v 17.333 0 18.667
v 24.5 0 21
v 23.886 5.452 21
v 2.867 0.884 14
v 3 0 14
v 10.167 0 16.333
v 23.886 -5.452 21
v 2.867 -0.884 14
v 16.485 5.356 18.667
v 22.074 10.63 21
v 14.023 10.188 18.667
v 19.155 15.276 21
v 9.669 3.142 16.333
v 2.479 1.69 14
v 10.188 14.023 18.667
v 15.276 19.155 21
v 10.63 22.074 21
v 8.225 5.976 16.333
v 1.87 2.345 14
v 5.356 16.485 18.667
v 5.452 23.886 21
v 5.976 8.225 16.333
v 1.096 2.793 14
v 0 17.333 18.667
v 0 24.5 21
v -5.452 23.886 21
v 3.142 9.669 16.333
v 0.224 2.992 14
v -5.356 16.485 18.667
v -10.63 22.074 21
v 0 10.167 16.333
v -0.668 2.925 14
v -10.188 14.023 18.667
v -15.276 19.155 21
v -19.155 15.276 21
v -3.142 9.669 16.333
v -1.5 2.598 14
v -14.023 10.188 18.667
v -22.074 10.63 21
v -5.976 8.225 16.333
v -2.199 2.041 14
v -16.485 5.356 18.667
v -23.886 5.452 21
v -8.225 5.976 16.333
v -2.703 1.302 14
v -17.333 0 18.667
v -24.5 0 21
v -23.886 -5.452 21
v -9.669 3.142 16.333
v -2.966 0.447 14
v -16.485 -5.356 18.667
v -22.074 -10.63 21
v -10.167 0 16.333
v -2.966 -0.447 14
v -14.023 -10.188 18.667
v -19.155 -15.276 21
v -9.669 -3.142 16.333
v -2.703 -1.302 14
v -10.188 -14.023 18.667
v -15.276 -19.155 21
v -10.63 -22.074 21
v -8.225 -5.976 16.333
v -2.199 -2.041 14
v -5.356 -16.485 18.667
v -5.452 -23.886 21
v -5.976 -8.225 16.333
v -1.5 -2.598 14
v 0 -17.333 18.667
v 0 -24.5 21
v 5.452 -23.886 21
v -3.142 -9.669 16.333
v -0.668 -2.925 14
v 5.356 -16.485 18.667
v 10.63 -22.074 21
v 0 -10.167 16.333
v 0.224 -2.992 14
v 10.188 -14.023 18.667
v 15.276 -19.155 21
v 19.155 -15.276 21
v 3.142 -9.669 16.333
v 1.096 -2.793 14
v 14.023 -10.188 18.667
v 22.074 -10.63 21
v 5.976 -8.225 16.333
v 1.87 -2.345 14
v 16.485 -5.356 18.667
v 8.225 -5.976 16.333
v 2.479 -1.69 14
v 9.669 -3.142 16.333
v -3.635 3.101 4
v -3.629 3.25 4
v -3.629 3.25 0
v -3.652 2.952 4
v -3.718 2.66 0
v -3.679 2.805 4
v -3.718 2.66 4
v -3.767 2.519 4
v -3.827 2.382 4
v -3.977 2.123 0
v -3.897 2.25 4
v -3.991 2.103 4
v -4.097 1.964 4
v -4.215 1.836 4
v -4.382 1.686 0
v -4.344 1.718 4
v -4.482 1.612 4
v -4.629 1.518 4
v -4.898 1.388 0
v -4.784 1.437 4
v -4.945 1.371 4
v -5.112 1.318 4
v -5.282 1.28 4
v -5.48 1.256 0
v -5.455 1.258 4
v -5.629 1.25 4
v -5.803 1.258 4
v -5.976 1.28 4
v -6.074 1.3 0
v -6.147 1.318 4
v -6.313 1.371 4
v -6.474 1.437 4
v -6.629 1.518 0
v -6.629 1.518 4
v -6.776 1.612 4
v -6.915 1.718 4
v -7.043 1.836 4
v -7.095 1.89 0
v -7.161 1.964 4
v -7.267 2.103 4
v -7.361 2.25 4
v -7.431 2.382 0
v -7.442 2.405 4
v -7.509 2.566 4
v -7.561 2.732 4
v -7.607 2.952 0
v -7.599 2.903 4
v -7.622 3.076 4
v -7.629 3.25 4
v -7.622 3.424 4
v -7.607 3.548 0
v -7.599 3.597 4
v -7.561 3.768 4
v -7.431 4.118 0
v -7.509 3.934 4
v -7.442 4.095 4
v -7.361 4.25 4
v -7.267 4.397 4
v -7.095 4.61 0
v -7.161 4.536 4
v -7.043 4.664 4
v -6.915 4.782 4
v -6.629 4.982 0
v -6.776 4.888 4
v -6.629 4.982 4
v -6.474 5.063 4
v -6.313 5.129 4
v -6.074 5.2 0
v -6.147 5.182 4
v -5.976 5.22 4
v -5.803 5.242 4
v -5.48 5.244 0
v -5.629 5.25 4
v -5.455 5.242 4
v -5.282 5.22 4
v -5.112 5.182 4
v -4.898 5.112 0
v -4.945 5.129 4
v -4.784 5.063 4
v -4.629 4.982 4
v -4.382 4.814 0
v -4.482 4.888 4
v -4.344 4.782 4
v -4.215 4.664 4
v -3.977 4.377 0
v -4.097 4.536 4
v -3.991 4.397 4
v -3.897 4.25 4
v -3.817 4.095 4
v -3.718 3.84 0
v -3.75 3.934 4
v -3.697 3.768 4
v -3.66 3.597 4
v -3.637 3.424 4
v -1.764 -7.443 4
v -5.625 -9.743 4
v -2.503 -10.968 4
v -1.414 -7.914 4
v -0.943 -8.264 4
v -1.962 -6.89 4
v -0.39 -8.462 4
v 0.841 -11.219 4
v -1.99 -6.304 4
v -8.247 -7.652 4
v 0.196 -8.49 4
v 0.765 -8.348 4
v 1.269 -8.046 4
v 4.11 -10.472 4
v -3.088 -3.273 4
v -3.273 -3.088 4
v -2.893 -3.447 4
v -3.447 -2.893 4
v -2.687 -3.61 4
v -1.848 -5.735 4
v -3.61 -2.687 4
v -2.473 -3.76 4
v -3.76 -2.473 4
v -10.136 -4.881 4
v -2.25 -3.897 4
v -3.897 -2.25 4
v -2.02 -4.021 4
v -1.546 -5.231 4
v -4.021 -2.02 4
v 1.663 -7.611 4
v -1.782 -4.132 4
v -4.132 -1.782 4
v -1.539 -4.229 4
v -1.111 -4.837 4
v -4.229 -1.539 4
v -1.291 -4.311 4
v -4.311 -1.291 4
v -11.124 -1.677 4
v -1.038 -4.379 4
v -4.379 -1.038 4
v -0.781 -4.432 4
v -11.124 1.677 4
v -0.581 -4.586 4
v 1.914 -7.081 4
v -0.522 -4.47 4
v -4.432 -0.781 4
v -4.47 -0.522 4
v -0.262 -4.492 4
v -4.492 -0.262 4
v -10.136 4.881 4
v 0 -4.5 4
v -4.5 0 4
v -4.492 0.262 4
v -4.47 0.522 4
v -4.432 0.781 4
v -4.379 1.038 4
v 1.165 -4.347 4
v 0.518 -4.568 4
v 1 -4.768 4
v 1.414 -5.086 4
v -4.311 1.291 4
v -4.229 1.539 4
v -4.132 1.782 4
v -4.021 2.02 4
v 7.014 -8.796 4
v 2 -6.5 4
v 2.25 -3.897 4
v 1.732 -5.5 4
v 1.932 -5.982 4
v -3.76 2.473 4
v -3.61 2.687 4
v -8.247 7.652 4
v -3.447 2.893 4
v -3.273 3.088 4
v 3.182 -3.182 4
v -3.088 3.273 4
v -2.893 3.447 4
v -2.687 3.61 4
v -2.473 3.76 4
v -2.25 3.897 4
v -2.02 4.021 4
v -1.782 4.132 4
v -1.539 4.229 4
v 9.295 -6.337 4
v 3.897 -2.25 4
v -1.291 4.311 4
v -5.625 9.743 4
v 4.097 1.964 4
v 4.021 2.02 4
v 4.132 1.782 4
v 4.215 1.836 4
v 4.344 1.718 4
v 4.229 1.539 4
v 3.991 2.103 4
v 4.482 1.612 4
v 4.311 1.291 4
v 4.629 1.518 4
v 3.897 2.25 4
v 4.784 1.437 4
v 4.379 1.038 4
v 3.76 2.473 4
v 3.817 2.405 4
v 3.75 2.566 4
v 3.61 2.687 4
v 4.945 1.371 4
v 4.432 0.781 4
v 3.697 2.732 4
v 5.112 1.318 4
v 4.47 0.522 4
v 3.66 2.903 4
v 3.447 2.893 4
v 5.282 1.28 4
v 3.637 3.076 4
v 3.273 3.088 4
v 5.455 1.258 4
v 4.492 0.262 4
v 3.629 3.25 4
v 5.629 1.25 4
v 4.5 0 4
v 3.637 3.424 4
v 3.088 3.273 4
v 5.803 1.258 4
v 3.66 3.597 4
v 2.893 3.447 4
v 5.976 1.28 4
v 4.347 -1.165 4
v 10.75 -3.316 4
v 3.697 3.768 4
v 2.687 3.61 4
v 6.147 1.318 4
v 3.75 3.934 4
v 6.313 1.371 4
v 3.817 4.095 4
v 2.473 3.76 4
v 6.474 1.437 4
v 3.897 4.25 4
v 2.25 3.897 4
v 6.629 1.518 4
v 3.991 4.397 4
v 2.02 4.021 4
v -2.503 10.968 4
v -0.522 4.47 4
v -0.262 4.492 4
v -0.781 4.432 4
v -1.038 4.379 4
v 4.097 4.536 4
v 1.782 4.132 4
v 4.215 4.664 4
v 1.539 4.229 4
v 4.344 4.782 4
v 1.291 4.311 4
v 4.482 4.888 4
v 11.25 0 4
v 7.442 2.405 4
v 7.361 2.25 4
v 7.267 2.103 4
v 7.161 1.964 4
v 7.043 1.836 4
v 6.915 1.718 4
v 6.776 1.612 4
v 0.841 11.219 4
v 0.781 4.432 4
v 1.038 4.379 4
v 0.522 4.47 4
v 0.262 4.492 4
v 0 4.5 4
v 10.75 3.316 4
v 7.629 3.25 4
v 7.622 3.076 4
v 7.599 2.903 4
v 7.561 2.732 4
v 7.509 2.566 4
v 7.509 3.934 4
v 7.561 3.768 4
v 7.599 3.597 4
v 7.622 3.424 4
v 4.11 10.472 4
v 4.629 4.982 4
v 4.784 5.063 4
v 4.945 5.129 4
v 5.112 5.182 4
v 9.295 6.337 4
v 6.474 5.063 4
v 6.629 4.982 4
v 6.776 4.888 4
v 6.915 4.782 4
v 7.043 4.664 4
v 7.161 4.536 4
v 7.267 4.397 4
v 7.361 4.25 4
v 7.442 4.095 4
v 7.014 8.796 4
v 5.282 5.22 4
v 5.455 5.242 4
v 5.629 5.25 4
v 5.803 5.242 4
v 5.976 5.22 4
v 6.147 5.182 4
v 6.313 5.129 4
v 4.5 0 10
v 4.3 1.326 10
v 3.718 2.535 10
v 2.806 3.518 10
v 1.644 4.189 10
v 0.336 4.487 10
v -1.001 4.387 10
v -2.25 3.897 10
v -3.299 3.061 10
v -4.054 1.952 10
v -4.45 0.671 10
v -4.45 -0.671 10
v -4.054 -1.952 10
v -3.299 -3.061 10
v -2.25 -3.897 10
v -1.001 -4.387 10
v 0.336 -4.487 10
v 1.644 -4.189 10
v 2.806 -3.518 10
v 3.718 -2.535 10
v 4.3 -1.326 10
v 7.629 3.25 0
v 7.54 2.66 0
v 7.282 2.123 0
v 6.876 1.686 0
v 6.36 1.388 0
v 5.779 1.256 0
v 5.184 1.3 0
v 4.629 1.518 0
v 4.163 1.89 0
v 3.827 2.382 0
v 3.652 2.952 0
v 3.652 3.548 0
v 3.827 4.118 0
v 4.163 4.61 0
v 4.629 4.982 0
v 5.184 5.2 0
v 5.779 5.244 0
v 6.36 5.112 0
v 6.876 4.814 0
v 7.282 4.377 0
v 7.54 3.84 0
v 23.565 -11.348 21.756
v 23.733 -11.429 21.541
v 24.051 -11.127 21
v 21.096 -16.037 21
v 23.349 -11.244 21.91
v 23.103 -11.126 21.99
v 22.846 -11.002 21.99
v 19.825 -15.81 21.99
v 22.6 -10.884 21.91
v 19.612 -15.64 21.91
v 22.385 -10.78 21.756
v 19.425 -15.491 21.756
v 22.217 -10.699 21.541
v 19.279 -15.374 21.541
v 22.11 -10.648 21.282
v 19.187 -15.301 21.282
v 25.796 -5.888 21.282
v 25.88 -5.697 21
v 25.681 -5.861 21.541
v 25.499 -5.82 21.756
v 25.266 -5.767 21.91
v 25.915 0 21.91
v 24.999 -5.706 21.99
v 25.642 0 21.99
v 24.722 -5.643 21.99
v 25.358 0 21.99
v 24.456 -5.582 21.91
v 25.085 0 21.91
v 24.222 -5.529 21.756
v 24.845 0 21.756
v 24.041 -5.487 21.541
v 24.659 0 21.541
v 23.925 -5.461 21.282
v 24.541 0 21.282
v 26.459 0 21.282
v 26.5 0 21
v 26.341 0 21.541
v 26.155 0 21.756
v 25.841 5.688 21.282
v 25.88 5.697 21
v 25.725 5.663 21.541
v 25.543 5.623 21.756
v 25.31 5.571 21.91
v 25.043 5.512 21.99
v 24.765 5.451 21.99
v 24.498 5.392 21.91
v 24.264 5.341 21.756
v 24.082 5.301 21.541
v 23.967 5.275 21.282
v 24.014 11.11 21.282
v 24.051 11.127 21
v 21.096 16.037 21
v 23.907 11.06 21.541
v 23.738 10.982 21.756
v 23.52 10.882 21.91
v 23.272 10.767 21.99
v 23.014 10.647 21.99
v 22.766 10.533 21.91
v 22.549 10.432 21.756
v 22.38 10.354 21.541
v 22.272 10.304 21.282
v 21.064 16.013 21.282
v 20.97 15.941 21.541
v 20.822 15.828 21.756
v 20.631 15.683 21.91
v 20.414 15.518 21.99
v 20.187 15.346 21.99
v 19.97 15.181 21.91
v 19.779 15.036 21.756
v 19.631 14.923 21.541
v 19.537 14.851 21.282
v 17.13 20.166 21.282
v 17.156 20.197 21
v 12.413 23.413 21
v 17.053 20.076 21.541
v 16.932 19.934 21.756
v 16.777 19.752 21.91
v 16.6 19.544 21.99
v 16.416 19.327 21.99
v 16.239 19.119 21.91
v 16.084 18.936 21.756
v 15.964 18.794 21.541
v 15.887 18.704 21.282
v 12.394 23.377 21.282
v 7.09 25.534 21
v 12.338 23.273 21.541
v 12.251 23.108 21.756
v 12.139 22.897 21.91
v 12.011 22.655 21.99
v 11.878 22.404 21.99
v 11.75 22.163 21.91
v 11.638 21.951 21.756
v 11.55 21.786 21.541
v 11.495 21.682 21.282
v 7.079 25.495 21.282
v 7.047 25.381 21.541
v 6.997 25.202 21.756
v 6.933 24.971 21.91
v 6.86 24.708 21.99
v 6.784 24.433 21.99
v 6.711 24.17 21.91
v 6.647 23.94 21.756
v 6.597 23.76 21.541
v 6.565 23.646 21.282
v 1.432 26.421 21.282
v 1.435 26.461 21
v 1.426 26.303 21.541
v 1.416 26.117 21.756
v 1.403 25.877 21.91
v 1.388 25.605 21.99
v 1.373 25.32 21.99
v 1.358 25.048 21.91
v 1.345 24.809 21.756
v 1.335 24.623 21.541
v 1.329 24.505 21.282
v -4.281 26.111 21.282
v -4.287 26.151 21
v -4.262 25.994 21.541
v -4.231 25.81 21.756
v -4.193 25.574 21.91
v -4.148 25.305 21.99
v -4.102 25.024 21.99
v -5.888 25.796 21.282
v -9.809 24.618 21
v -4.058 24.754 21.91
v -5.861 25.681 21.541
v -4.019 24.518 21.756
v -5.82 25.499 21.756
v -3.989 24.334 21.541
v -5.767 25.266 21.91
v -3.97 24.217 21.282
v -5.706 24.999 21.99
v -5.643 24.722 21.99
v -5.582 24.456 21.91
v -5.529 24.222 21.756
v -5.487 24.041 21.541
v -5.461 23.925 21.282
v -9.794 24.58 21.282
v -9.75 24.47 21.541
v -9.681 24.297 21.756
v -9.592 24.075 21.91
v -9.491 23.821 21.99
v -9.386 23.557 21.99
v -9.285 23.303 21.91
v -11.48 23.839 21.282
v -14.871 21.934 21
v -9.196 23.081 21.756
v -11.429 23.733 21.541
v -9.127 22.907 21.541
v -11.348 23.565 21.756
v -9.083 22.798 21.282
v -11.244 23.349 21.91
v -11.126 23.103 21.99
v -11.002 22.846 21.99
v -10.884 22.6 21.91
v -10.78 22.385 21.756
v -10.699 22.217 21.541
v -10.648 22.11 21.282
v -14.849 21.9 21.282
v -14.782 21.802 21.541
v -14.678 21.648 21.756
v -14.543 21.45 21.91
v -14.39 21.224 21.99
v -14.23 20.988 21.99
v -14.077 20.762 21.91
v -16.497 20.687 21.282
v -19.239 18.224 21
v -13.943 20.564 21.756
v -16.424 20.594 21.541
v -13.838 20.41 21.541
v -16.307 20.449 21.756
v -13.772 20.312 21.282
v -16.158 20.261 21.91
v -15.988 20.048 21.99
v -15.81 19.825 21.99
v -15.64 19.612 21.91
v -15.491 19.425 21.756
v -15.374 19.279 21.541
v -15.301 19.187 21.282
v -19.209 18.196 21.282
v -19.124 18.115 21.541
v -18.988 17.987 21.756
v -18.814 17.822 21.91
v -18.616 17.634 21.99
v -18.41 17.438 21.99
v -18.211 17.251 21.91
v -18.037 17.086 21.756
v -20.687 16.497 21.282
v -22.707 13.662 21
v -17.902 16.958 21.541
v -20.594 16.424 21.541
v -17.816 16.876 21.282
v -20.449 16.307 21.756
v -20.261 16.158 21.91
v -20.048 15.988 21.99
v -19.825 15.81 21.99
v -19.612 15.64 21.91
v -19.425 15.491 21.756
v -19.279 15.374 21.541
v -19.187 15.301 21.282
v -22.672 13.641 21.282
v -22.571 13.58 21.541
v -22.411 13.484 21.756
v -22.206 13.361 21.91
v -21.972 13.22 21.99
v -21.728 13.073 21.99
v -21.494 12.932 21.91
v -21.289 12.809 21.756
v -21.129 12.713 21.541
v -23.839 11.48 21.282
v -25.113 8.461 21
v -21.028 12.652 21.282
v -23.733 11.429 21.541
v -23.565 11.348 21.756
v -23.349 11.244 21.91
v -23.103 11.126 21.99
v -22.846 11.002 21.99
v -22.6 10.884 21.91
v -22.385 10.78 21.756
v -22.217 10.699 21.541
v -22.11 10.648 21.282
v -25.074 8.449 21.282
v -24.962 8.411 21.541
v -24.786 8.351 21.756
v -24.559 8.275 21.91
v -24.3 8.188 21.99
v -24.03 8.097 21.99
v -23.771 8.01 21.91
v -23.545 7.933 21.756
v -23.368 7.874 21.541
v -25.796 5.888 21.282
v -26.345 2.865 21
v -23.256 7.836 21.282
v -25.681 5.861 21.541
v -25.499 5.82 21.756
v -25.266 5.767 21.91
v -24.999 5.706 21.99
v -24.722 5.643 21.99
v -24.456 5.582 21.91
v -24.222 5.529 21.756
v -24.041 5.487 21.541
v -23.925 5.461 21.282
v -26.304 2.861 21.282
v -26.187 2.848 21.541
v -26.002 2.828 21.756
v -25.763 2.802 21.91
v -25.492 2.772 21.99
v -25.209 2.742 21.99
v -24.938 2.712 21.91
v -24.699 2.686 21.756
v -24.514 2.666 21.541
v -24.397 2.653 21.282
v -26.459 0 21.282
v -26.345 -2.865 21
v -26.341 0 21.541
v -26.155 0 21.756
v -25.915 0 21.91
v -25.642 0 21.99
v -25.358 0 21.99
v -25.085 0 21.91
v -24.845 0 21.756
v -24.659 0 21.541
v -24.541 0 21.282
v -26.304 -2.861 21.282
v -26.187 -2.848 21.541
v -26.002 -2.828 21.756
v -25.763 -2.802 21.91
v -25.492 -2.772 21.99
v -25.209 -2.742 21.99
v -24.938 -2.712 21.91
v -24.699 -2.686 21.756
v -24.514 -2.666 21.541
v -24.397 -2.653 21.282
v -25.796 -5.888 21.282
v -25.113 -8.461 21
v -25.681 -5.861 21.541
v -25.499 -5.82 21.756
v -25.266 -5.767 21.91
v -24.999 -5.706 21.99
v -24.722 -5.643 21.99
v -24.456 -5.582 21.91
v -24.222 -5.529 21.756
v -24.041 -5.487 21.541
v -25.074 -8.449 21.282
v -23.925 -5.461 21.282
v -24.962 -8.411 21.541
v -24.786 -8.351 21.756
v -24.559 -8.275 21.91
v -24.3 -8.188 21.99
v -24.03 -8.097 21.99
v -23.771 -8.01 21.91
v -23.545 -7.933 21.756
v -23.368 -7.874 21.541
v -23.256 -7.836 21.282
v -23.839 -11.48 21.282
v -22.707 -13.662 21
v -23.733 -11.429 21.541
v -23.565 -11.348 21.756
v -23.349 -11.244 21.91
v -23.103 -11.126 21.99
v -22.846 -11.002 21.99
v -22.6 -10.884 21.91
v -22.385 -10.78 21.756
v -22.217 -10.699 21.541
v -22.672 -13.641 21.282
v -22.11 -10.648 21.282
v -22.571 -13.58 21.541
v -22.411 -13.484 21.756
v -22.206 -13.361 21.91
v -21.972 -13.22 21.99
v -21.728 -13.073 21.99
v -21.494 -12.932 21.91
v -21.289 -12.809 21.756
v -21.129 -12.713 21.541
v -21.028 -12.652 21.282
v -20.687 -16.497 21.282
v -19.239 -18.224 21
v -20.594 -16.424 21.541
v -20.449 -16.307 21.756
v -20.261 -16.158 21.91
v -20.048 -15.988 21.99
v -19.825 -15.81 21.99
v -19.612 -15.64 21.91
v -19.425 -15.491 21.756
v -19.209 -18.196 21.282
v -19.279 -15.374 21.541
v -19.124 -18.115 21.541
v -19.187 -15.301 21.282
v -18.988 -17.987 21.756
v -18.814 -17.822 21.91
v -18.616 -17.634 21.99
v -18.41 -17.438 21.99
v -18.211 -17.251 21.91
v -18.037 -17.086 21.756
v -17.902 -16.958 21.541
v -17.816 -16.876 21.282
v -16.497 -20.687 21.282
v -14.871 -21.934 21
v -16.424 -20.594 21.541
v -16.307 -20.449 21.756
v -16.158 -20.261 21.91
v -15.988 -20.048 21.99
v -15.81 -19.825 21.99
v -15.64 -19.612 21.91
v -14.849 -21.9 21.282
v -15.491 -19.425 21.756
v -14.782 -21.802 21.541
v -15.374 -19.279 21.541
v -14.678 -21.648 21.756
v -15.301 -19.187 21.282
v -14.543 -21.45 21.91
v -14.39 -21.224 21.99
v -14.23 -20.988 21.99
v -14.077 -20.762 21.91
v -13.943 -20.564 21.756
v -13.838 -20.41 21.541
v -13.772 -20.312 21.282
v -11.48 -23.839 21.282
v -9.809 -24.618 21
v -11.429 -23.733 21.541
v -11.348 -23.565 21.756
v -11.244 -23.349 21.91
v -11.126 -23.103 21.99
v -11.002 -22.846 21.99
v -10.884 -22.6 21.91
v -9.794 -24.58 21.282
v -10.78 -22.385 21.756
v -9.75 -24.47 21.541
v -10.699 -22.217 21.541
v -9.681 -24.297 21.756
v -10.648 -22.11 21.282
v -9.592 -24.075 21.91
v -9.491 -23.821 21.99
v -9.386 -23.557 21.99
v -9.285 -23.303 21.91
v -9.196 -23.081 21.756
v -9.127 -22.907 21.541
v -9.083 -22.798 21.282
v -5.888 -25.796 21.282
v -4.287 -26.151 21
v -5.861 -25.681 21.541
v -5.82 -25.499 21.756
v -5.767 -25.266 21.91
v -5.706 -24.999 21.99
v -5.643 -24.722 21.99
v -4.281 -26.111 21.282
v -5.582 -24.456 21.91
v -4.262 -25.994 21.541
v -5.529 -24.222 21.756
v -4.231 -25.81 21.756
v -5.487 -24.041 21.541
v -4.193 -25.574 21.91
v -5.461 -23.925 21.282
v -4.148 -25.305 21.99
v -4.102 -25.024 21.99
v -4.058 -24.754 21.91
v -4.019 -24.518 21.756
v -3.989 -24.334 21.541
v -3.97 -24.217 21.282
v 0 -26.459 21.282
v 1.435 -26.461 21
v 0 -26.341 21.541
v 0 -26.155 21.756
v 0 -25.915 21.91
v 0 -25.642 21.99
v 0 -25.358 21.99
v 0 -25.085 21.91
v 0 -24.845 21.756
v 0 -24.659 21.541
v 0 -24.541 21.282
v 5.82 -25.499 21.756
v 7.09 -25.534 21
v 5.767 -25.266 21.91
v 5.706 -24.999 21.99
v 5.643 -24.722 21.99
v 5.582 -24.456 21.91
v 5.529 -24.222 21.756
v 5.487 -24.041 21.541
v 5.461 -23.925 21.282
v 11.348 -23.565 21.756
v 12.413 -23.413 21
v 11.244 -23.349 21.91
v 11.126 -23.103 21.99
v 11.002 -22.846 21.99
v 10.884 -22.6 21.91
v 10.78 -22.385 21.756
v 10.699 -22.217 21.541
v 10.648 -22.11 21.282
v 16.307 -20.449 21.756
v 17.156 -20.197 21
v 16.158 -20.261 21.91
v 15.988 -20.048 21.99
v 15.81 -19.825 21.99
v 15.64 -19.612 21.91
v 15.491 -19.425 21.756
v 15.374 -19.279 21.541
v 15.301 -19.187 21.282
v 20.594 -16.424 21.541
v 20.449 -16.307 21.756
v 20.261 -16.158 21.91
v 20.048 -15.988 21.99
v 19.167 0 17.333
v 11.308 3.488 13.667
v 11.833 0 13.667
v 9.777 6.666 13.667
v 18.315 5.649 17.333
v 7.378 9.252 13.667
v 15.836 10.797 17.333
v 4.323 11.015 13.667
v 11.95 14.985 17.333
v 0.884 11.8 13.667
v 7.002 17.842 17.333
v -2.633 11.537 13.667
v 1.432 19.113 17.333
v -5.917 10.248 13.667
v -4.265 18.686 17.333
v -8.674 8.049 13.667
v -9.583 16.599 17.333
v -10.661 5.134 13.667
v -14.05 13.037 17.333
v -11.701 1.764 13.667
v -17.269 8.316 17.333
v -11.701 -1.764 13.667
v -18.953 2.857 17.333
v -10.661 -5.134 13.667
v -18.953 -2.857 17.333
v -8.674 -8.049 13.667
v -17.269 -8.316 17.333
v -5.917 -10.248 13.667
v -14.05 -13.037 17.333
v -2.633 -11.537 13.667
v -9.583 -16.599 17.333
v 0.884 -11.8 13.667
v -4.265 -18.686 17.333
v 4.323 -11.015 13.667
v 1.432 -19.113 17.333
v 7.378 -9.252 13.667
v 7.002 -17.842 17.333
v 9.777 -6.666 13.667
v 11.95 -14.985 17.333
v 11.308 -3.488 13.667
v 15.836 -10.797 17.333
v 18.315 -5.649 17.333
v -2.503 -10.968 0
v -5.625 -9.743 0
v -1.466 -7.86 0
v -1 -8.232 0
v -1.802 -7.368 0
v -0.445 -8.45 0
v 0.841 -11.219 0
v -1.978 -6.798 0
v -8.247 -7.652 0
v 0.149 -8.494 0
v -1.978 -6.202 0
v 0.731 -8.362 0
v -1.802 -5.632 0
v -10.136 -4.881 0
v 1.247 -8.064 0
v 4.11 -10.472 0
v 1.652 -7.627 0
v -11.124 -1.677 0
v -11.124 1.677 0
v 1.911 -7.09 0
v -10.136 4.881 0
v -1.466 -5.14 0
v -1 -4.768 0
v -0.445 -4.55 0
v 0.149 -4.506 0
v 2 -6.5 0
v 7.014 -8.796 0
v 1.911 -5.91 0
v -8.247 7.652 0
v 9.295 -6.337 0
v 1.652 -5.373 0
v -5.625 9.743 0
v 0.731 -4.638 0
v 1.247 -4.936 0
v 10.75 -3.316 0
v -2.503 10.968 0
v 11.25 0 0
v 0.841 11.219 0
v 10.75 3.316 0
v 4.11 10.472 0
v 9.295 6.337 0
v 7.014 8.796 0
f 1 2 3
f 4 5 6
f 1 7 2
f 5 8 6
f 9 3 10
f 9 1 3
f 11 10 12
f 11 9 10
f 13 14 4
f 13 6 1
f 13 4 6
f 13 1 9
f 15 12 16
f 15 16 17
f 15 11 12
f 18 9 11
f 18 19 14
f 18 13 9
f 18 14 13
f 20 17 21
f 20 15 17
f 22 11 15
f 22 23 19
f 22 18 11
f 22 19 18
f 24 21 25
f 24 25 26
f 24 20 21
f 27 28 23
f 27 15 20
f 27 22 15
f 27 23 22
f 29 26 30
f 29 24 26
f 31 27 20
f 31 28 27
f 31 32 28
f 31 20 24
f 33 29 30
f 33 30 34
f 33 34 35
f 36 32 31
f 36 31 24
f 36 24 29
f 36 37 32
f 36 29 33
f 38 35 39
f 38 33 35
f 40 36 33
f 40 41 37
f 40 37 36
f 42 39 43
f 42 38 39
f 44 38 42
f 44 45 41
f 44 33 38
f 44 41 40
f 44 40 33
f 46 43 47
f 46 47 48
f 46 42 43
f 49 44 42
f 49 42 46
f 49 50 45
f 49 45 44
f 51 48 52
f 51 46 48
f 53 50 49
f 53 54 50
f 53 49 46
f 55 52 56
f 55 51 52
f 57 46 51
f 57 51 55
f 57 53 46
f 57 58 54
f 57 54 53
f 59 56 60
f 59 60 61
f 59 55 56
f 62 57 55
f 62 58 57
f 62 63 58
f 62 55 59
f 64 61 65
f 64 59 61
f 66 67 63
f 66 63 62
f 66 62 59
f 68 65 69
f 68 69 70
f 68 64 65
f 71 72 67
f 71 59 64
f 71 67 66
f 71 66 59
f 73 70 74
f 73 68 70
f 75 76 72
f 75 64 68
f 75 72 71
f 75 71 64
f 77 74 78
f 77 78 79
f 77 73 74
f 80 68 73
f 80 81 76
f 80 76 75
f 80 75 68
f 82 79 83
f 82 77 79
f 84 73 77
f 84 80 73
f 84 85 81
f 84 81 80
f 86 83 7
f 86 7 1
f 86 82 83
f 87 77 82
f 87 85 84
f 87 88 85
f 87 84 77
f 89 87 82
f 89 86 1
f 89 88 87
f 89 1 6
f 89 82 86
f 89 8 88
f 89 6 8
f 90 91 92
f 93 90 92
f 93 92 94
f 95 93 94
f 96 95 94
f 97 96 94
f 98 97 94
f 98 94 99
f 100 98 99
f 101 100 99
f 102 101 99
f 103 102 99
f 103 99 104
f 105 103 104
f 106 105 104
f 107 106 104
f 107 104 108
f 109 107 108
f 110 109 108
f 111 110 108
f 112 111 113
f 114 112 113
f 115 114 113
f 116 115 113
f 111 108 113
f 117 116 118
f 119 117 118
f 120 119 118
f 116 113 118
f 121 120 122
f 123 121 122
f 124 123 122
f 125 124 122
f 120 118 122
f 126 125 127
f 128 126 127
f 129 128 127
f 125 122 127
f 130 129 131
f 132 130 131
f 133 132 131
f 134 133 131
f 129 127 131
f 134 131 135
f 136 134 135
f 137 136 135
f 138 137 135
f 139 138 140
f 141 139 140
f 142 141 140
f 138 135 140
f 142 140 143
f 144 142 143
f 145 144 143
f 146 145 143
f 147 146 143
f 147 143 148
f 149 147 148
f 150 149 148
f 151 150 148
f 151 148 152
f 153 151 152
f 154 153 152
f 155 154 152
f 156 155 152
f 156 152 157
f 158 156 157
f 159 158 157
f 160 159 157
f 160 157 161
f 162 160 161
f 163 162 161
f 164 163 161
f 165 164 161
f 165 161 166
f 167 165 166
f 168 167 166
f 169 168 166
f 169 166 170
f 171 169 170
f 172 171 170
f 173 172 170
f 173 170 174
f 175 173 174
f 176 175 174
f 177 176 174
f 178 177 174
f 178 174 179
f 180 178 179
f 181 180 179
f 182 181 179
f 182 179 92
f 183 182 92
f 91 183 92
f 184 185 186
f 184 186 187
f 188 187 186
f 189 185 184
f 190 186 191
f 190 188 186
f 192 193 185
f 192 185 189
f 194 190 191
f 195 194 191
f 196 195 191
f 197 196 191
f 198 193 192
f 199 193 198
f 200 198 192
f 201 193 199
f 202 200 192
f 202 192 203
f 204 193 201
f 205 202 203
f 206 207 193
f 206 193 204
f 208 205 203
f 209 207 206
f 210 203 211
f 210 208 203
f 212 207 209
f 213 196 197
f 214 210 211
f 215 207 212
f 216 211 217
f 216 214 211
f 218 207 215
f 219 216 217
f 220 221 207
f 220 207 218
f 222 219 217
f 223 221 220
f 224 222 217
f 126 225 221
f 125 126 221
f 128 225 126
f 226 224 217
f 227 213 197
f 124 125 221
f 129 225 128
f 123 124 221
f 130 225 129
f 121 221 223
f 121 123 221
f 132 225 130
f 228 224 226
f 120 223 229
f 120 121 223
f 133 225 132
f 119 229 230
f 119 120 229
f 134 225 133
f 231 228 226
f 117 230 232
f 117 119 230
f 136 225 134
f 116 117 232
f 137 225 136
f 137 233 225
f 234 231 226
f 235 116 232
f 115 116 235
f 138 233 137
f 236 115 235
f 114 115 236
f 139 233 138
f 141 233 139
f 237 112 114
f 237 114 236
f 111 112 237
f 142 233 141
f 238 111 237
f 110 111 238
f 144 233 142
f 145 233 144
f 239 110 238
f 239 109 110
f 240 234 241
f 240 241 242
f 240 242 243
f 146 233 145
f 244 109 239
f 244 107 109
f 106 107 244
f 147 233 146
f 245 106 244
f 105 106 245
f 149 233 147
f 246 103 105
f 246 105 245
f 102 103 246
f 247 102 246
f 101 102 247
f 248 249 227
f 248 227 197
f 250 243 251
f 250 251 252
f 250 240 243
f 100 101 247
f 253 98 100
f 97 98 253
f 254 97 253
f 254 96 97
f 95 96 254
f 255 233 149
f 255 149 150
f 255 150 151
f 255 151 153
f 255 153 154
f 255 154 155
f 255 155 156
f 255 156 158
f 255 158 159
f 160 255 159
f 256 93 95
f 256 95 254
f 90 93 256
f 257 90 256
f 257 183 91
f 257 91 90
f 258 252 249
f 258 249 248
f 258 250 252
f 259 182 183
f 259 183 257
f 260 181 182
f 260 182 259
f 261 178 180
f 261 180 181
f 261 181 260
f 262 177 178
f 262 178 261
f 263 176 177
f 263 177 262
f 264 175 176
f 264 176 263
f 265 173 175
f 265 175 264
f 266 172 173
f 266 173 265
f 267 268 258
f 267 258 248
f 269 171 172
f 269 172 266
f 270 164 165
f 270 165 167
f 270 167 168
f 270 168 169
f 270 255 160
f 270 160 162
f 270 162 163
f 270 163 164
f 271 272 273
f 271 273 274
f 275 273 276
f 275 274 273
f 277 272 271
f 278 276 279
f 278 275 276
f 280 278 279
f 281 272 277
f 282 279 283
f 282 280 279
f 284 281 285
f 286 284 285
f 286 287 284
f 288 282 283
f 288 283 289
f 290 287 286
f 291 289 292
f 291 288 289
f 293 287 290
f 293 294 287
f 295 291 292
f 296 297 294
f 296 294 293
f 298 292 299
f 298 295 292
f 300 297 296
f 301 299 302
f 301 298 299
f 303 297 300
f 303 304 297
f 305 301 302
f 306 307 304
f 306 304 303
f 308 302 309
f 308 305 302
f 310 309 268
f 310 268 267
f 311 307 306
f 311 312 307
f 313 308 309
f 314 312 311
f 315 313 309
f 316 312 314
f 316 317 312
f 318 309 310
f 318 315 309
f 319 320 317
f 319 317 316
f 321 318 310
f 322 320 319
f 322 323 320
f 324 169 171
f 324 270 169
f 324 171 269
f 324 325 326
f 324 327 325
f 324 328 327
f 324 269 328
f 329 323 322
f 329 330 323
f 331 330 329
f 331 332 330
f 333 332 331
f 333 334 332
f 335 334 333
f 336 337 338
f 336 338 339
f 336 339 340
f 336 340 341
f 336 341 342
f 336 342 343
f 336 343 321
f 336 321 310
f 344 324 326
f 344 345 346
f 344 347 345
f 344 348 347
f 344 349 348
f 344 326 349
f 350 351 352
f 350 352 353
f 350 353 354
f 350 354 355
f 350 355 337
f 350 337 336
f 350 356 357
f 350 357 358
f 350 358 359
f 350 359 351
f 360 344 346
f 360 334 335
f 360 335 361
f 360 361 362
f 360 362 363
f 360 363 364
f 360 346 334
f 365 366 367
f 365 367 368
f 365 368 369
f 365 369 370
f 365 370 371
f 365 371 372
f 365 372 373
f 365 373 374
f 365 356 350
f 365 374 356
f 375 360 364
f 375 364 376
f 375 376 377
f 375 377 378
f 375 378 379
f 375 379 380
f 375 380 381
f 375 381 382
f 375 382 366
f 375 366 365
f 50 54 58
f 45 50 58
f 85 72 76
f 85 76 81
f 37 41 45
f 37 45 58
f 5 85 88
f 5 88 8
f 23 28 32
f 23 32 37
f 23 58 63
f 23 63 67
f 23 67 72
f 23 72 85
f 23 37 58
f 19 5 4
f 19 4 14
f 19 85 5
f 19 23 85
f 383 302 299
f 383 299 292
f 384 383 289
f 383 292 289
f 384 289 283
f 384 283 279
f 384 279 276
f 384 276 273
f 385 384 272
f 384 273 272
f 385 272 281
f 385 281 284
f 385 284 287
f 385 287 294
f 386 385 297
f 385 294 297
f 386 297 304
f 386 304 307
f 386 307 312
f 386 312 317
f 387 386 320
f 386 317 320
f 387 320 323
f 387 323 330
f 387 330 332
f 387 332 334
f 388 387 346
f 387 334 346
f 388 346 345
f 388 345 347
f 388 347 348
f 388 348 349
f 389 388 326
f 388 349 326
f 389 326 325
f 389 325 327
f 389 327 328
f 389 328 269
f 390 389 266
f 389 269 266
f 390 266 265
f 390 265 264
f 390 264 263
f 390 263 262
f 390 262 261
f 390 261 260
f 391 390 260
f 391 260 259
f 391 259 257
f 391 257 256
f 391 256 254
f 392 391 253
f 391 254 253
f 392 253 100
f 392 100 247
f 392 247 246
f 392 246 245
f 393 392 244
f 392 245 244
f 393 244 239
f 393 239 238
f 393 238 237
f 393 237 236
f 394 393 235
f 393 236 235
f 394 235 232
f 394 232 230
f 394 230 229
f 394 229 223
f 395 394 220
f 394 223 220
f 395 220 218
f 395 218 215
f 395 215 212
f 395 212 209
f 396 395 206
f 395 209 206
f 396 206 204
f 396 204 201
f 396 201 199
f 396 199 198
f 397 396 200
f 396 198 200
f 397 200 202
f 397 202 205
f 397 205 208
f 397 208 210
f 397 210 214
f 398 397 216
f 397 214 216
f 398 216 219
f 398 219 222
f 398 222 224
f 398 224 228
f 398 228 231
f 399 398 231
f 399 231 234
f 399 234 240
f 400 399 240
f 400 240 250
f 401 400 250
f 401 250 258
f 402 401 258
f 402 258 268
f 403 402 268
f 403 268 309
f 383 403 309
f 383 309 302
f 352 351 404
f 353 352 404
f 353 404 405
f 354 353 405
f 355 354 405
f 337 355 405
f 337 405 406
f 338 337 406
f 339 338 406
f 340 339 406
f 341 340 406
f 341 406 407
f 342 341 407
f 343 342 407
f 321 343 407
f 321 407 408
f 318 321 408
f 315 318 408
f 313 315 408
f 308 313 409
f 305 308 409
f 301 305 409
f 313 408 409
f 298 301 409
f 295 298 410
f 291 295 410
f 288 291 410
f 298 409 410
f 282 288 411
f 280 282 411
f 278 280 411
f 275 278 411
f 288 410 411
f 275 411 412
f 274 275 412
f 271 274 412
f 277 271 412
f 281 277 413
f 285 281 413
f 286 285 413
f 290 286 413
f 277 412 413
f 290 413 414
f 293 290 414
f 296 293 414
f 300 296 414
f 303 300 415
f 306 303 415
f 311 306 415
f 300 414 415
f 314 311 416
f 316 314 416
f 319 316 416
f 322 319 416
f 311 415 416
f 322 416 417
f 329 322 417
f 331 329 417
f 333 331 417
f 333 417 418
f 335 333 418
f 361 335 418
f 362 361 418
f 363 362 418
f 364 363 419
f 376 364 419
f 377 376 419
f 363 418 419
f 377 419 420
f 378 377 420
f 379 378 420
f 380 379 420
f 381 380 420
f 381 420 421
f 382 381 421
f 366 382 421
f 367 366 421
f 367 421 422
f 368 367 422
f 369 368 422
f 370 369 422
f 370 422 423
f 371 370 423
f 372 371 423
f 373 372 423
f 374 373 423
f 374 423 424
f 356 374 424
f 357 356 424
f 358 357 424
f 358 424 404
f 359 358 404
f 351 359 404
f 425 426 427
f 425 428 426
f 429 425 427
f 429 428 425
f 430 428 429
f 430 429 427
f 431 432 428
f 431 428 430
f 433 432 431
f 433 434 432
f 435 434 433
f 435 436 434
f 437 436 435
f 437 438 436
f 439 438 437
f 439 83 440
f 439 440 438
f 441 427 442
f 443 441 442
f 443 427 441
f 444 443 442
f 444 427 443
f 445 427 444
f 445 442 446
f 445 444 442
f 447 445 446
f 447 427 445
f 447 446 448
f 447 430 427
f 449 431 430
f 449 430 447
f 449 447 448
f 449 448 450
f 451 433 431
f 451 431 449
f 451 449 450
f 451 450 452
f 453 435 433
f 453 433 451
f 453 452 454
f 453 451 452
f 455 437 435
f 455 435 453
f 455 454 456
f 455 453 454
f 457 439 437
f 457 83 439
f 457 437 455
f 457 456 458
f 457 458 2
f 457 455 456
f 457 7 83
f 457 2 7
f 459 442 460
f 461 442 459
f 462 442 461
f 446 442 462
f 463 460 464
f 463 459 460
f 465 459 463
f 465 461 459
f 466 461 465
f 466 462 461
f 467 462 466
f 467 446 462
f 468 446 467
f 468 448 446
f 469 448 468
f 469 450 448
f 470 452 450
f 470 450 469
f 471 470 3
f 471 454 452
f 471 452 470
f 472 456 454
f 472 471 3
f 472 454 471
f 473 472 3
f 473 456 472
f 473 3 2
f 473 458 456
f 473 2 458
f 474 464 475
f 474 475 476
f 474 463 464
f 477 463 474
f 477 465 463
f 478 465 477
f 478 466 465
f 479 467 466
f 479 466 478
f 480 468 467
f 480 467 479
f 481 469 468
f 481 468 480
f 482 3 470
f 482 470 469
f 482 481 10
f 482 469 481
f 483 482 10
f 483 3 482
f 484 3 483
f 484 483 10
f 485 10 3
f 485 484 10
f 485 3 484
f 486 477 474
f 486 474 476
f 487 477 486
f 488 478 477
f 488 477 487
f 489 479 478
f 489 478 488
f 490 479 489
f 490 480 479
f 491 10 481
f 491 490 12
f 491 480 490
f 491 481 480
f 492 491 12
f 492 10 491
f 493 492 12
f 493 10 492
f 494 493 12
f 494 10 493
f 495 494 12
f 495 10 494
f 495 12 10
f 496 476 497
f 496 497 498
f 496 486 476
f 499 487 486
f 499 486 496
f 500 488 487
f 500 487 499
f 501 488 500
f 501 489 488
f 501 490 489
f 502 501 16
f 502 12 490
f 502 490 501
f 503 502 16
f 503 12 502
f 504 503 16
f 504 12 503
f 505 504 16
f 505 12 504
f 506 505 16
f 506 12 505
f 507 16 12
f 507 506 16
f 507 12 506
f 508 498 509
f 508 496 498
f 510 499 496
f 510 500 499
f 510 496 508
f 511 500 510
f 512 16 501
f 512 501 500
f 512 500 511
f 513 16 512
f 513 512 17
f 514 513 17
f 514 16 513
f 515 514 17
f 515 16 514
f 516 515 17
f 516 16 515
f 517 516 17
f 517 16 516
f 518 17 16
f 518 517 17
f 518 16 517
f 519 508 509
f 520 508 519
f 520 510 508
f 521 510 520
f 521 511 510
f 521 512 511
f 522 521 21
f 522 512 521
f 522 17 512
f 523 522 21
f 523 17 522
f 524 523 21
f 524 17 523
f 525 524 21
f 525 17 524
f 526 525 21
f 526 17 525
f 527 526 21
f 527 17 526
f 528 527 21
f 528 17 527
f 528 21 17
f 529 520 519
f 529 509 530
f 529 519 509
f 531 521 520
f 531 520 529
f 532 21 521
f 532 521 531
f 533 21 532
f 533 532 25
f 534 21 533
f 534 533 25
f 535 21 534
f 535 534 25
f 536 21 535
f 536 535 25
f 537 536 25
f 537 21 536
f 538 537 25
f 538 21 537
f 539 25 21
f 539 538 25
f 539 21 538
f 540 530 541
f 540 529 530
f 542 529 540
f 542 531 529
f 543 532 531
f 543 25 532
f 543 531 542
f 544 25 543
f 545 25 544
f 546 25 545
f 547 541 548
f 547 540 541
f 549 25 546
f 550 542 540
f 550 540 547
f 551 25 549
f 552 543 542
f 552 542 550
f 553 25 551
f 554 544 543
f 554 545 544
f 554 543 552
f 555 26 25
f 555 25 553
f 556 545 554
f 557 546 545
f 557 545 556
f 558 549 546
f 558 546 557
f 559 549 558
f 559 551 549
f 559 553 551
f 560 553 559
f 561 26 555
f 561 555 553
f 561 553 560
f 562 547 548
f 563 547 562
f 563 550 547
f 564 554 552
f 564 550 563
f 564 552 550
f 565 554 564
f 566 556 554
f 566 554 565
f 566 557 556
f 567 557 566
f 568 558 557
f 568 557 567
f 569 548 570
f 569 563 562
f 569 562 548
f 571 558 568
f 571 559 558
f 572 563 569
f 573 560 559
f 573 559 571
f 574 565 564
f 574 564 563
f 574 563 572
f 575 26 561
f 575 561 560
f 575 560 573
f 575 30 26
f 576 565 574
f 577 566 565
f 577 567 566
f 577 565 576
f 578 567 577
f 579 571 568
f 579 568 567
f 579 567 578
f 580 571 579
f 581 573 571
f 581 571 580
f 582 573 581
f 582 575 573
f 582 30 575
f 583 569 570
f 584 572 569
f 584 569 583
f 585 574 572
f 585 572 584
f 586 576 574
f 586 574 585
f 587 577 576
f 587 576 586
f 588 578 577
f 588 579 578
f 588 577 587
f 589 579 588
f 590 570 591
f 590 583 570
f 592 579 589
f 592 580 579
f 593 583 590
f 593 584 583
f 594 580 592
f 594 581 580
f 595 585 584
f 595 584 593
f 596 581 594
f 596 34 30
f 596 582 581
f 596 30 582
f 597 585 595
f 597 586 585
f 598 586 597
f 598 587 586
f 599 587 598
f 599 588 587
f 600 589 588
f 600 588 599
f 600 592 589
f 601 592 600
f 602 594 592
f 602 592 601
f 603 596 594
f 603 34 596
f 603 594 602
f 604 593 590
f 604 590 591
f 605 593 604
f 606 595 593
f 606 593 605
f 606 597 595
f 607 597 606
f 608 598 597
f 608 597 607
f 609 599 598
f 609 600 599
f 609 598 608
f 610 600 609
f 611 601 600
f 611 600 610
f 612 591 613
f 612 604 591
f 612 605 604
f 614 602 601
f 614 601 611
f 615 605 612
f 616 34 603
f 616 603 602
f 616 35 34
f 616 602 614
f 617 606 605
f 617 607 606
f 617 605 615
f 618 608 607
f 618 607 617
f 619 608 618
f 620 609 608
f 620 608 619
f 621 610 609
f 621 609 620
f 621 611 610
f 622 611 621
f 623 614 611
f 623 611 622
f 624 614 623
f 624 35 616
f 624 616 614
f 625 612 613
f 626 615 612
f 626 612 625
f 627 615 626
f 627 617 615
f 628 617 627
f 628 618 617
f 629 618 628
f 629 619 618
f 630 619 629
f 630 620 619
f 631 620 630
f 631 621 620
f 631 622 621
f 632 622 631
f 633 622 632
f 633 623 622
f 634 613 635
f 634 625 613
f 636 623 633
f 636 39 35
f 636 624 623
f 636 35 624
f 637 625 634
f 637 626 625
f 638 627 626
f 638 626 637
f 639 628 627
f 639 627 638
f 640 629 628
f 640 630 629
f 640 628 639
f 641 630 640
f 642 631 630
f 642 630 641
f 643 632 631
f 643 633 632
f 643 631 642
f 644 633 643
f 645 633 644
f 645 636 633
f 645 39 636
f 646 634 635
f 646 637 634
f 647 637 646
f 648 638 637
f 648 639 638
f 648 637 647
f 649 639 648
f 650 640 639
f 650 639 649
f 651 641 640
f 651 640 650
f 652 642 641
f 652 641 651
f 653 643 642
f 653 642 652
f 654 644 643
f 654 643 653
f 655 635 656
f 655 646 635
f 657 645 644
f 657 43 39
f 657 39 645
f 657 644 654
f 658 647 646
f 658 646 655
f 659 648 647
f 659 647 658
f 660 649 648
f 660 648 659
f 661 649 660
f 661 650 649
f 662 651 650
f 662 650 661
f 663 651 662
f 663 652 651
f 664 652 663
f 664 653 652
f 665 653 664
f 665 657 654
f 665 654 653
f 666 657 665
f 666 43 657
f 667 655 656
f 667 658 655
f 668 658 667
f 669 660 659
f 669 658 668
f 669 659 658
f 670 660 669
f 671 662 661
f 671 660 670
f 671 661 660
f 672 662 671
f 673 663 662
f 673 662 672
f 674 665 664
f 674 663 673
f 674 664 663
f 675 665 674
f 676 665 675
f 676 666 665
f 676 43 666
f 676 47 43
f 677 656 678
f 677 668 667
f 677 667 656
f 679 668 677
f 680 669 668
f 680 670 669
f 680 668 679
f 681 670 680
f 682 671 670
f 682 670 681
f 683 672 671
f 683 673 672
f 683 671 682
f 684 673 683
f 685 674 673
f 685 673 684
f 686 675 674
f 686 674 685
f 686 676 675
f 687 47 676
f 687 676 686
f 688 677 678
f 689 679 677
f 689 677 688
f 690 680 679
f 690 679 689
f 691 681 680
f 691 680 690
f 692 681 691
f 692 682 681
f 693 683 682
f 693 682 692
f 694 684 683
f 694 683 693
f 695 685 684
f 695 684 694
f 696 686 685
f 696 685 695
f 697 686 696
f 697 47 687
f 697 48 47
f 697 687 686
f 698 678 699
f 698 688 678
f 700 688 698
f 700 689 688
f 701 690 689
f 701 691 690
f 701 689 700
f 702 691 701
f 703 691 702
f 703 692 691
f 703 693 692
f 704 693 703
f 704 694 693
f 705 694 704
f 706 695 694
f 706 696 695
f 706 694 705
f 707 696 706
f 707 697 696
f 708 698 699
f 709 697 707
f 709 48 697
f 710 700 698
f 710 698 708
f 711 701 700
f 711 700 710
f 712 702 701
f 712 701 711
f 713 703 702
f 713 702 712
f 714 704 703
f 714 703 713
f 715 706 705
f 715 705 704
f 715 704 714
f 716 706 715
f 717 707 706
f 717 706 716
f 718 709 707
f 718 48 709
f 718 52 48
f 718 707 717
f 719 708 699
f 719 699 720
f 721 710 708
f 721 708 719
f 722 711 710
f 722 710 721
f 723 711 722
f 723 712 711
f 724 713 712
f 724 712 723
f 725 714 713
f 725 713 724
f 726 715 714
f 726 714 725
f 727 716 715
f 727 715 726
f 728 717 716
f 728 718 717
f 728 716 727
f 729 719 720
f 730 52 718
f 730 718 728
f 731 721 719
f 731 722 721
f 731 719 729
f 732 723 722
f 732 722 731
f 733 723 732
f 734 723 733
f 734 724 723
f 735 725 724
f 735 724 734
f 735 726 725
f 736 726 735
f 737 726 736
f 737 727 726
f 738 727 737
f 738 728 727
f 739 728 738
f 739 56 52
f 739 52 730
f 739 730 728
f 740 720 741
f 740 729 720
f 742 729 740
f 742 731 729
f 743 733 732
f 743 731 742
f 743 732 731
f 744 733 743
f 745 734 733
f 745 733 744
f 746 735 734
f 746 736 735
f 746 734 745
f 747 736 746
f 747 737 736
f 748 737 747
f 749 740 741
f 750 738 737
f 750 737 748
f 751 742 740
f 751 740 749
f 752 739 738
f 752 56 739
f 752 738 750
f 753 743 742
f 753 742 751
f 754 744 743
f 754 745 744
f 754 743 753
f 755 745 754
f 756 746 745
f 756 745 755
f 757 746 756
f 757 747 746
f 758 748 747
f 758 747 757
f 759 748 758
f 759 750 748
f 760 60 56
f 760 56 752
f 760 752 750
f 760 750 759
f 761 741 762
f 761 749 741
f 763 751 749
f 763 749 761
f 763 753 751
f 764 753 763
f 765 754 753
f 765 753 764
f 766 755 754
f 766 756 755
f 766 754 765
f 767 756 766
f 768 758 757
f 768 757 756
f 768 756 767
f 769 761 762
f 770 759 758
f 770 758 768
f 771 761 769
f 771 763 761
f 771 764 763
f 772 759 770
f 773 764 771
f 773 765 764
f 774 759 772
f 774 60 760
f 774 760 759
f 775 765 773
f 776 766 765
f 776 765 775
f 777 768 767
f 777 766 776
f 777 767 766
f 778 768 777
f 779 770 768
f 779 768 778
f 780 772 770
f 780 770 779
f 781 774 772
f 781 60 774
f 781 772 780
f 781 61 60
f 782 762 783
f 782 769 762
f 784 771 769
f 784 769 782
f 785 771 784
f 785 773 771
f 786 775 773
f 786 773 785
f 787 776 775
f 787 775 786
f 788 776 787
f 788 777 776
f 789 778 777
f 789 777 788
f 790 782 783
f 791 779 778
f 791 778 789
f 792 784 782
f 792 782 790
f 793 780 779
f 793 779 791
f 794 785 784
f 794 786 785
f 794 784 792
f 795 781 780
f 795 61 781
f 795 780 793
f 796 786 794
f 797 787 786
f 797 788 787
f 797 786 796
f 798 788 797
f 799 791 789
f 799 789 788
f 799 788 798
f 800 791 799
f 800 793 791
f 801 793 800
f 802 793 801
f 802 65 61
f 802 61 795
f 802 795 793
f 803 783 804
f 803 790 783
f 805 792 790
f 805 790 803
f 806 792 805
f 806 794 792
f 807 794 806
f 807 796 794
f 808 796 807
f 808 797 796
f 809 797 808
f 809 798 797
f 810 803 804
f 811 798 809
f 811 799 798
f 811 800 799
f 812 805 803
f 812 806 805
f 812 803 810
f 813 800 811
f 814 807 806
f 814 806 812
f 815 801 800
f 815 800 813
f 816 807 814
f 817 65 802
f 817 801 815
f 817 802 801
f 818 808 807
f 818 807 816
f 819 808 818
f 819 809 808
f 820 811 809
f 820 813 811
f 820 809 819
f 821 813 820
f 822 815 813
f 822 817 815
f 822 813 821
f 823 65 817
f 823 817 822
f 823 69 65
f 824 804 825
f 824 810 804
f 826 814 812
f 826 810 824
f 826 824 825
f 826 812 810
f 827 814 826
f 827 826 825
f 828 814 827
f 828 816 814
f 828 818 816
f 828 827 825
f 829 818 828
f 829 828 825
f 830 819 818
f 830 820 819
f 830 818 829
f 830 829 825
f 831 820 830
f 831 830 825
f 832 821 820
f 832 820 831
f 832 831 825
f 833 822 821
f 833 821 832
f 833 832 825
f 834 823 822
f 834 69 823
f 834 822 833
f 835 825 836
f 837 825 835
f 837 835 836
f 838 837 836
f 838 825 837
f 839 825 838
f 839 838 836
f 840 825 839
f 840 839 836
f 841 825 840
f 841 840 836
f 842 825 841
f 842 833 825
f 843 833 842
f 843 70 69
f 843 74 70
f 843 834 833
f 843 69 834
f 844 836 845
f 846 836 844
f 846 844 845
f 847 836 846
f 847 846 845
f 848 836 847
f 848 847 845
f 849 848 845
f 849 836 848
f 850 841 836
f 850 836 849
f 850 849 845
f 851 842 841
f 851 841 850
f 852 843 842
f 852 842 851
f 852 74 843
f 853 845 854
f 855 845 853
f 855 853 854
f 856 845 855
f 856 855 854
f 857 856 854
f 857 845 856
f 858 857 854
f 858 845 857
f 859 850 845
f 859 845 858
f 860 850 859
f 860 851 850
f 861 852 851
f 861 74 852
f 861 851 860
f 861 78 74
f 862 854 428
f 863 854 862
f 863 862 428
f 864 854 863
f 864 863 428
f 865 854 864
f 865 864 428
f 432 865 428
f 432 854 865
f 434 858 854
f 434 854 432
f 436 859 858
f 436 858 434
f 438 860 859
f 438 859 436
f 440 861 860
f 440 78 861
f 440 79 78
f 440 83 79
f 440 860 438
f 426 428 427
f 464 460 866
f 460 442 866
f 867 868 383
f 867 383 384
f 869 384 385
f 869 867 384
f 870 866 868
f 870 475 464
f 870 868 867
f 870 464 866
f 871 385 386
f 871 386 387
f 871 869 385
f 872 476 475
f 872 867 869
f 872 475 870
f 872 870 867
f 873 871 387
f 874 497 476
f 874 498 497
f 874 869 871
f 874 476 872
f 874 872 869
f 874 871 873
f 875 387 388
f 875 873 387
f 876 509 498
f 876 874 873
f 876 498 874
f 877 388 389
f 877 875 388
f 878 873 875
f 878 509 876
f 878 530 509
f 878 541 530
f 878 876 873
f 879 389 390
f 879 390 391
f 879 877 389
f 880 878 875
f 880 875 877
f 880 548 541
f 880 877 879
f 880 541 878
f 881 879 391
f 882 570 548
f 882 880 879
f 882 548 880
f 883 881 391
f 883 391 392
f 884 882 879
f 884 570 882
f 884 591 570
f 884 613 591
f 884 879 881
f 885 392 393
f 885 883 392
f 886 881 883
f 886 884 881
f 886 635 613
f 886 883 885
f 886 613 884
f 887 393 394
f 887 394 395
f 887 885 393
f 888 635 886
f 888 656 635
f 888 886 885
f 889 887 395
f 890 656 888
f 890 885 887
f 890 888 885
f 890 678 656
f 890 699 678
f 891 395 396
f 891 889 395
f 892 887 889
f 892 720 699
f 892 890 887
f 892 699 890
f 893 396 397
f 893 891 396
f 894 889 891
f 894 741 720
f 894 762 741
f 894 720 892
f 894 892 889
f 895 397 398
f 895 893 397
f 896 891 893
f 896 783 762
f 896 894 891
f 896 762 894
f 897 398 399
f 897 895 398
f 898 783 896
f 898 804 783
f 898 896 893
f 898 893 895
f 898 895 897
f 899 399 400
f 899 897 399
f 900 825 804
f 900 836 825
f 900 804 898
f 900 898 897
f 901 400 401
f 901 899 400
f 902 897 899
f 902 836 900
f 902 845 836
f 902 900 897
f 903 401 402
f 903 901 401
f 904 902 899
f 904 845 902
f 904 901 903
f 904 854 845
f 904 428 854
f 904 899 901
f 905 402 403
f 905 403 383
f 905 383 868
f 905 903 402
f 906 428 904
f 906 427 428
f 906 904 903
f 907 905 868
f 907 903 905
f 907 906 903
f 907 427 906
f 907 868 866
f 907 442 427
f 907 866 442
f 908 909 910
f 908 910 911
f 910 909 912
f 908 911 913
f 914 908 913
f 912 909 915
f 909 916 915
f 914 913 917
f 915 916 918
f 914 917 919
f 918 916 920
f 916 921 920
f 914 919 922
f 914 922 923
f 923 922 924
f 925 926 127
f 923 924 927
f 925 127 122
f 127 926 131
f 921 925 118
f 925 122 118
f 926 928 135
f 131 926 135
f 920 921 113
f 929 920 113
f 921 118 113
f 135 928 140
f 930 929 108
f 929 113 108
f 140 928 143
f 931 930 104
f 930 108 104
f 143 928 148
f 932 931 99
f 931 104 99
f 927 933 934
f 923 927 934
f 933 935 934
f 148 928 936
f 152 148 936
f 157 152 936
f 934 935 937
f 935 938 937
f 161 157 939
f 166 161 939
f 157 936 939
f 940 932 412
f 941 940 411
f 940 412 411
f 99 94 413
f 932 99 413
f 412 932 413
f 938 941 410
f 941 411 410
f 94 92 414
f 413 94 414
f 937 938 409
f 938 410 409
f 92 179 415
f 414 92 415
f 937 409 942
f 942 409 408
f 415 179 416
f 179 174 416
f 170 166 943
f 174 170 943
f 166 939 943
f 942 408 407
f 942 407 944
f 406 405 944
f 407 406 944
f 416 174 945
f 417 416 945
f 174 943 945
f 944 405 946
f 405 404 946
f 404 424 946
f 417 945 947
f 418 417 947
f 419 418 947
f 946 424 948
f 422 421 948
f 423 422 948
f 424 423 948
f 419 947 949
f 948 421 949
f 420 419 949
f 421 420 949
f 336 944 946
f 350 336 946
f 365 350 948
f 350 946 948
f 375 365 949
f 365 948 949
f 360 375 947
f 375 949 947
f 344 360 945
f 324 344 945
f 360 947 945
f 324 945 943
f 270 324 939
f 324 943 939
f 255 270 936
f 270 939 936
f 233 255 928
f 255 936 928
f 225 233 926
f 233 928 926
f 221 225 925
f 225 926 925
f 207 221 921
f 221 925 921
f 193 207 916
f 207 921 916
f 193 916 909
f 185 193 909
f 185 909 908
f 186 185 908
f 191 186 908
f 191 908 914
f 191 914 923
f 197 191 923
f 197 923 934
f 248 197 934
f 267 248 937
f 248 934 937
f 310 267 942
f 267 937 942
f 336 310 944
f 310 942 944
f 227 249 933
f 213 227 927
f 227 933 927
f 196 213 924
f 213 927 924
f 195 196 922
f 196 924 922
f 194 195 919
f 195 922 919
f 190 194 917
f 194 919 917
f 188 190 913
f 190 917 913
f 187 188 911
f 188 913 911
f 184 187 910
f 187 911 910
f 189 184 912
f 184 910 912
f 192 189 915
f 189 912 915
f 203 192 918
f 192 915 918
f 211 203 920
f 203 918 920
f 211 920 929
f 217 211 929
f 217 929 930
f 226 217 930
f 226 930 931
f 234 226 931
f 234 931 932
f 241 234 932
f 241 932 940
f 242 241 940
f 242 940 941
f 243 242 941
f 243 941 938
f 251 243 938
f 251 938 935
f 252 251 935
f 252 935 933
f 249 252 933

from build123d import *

# Parameters (mm, degrees)
F0_R     = 11.25
F1_DEPTH = 4
F2_R     = 4.5
F3_DEPTH = 6
F6_R     = 2
F7_DEPTH = 4


with BuildPart() as f1:
    # F0 (on Top) → F1 (new body)
    with BuildSketch(Plane.XY):
        Circle(F0_R)
    extrude(amount=F1_DEPTH)

    # F2 (on face) → F3 (join)
    with BuildSketch(Plane.XY.offset(4)):
        Circle(F2_R)
    extrude(amount=F3_DEPTH)

    # F4 (on Front) → F5 (revolve)
    with BuildSketch(Plane.XZ):
        with BuildLine():
            Line((3, 14), (0, 14))
            Line((0, 14), (0, 10))
            Line((0, 10), (4.5, 10))
            Line((4.5, 10), (26.5, 21))
            ThreePointArc((26.5, 21), (25.5, 22), (24.5, 21))
            Line((24.5, 21), (3, 14))
        make_face()
    revolve(axis=Axis((0, 0, 19.201497), (0, 0, 1)))

    # F6 (on face) → F7 (cut, through all)
    with BuildSketch(Plane(origin=(0, 0, 0), x_dir=(1, 0, 0), z_dir=(0, 0, -1))):
        with Locations((-5.629165, -3.25)):
            Circle(F6_R)
        with Locations((5.629165, -3.25)):
            Circle(F6_R)
        with Locations((0, 6.5)):
            Circle(F6_R)
    extrude(amount=-F7_DEPTH, mode=Mode.SUBTRACT)


solid = f1.part
